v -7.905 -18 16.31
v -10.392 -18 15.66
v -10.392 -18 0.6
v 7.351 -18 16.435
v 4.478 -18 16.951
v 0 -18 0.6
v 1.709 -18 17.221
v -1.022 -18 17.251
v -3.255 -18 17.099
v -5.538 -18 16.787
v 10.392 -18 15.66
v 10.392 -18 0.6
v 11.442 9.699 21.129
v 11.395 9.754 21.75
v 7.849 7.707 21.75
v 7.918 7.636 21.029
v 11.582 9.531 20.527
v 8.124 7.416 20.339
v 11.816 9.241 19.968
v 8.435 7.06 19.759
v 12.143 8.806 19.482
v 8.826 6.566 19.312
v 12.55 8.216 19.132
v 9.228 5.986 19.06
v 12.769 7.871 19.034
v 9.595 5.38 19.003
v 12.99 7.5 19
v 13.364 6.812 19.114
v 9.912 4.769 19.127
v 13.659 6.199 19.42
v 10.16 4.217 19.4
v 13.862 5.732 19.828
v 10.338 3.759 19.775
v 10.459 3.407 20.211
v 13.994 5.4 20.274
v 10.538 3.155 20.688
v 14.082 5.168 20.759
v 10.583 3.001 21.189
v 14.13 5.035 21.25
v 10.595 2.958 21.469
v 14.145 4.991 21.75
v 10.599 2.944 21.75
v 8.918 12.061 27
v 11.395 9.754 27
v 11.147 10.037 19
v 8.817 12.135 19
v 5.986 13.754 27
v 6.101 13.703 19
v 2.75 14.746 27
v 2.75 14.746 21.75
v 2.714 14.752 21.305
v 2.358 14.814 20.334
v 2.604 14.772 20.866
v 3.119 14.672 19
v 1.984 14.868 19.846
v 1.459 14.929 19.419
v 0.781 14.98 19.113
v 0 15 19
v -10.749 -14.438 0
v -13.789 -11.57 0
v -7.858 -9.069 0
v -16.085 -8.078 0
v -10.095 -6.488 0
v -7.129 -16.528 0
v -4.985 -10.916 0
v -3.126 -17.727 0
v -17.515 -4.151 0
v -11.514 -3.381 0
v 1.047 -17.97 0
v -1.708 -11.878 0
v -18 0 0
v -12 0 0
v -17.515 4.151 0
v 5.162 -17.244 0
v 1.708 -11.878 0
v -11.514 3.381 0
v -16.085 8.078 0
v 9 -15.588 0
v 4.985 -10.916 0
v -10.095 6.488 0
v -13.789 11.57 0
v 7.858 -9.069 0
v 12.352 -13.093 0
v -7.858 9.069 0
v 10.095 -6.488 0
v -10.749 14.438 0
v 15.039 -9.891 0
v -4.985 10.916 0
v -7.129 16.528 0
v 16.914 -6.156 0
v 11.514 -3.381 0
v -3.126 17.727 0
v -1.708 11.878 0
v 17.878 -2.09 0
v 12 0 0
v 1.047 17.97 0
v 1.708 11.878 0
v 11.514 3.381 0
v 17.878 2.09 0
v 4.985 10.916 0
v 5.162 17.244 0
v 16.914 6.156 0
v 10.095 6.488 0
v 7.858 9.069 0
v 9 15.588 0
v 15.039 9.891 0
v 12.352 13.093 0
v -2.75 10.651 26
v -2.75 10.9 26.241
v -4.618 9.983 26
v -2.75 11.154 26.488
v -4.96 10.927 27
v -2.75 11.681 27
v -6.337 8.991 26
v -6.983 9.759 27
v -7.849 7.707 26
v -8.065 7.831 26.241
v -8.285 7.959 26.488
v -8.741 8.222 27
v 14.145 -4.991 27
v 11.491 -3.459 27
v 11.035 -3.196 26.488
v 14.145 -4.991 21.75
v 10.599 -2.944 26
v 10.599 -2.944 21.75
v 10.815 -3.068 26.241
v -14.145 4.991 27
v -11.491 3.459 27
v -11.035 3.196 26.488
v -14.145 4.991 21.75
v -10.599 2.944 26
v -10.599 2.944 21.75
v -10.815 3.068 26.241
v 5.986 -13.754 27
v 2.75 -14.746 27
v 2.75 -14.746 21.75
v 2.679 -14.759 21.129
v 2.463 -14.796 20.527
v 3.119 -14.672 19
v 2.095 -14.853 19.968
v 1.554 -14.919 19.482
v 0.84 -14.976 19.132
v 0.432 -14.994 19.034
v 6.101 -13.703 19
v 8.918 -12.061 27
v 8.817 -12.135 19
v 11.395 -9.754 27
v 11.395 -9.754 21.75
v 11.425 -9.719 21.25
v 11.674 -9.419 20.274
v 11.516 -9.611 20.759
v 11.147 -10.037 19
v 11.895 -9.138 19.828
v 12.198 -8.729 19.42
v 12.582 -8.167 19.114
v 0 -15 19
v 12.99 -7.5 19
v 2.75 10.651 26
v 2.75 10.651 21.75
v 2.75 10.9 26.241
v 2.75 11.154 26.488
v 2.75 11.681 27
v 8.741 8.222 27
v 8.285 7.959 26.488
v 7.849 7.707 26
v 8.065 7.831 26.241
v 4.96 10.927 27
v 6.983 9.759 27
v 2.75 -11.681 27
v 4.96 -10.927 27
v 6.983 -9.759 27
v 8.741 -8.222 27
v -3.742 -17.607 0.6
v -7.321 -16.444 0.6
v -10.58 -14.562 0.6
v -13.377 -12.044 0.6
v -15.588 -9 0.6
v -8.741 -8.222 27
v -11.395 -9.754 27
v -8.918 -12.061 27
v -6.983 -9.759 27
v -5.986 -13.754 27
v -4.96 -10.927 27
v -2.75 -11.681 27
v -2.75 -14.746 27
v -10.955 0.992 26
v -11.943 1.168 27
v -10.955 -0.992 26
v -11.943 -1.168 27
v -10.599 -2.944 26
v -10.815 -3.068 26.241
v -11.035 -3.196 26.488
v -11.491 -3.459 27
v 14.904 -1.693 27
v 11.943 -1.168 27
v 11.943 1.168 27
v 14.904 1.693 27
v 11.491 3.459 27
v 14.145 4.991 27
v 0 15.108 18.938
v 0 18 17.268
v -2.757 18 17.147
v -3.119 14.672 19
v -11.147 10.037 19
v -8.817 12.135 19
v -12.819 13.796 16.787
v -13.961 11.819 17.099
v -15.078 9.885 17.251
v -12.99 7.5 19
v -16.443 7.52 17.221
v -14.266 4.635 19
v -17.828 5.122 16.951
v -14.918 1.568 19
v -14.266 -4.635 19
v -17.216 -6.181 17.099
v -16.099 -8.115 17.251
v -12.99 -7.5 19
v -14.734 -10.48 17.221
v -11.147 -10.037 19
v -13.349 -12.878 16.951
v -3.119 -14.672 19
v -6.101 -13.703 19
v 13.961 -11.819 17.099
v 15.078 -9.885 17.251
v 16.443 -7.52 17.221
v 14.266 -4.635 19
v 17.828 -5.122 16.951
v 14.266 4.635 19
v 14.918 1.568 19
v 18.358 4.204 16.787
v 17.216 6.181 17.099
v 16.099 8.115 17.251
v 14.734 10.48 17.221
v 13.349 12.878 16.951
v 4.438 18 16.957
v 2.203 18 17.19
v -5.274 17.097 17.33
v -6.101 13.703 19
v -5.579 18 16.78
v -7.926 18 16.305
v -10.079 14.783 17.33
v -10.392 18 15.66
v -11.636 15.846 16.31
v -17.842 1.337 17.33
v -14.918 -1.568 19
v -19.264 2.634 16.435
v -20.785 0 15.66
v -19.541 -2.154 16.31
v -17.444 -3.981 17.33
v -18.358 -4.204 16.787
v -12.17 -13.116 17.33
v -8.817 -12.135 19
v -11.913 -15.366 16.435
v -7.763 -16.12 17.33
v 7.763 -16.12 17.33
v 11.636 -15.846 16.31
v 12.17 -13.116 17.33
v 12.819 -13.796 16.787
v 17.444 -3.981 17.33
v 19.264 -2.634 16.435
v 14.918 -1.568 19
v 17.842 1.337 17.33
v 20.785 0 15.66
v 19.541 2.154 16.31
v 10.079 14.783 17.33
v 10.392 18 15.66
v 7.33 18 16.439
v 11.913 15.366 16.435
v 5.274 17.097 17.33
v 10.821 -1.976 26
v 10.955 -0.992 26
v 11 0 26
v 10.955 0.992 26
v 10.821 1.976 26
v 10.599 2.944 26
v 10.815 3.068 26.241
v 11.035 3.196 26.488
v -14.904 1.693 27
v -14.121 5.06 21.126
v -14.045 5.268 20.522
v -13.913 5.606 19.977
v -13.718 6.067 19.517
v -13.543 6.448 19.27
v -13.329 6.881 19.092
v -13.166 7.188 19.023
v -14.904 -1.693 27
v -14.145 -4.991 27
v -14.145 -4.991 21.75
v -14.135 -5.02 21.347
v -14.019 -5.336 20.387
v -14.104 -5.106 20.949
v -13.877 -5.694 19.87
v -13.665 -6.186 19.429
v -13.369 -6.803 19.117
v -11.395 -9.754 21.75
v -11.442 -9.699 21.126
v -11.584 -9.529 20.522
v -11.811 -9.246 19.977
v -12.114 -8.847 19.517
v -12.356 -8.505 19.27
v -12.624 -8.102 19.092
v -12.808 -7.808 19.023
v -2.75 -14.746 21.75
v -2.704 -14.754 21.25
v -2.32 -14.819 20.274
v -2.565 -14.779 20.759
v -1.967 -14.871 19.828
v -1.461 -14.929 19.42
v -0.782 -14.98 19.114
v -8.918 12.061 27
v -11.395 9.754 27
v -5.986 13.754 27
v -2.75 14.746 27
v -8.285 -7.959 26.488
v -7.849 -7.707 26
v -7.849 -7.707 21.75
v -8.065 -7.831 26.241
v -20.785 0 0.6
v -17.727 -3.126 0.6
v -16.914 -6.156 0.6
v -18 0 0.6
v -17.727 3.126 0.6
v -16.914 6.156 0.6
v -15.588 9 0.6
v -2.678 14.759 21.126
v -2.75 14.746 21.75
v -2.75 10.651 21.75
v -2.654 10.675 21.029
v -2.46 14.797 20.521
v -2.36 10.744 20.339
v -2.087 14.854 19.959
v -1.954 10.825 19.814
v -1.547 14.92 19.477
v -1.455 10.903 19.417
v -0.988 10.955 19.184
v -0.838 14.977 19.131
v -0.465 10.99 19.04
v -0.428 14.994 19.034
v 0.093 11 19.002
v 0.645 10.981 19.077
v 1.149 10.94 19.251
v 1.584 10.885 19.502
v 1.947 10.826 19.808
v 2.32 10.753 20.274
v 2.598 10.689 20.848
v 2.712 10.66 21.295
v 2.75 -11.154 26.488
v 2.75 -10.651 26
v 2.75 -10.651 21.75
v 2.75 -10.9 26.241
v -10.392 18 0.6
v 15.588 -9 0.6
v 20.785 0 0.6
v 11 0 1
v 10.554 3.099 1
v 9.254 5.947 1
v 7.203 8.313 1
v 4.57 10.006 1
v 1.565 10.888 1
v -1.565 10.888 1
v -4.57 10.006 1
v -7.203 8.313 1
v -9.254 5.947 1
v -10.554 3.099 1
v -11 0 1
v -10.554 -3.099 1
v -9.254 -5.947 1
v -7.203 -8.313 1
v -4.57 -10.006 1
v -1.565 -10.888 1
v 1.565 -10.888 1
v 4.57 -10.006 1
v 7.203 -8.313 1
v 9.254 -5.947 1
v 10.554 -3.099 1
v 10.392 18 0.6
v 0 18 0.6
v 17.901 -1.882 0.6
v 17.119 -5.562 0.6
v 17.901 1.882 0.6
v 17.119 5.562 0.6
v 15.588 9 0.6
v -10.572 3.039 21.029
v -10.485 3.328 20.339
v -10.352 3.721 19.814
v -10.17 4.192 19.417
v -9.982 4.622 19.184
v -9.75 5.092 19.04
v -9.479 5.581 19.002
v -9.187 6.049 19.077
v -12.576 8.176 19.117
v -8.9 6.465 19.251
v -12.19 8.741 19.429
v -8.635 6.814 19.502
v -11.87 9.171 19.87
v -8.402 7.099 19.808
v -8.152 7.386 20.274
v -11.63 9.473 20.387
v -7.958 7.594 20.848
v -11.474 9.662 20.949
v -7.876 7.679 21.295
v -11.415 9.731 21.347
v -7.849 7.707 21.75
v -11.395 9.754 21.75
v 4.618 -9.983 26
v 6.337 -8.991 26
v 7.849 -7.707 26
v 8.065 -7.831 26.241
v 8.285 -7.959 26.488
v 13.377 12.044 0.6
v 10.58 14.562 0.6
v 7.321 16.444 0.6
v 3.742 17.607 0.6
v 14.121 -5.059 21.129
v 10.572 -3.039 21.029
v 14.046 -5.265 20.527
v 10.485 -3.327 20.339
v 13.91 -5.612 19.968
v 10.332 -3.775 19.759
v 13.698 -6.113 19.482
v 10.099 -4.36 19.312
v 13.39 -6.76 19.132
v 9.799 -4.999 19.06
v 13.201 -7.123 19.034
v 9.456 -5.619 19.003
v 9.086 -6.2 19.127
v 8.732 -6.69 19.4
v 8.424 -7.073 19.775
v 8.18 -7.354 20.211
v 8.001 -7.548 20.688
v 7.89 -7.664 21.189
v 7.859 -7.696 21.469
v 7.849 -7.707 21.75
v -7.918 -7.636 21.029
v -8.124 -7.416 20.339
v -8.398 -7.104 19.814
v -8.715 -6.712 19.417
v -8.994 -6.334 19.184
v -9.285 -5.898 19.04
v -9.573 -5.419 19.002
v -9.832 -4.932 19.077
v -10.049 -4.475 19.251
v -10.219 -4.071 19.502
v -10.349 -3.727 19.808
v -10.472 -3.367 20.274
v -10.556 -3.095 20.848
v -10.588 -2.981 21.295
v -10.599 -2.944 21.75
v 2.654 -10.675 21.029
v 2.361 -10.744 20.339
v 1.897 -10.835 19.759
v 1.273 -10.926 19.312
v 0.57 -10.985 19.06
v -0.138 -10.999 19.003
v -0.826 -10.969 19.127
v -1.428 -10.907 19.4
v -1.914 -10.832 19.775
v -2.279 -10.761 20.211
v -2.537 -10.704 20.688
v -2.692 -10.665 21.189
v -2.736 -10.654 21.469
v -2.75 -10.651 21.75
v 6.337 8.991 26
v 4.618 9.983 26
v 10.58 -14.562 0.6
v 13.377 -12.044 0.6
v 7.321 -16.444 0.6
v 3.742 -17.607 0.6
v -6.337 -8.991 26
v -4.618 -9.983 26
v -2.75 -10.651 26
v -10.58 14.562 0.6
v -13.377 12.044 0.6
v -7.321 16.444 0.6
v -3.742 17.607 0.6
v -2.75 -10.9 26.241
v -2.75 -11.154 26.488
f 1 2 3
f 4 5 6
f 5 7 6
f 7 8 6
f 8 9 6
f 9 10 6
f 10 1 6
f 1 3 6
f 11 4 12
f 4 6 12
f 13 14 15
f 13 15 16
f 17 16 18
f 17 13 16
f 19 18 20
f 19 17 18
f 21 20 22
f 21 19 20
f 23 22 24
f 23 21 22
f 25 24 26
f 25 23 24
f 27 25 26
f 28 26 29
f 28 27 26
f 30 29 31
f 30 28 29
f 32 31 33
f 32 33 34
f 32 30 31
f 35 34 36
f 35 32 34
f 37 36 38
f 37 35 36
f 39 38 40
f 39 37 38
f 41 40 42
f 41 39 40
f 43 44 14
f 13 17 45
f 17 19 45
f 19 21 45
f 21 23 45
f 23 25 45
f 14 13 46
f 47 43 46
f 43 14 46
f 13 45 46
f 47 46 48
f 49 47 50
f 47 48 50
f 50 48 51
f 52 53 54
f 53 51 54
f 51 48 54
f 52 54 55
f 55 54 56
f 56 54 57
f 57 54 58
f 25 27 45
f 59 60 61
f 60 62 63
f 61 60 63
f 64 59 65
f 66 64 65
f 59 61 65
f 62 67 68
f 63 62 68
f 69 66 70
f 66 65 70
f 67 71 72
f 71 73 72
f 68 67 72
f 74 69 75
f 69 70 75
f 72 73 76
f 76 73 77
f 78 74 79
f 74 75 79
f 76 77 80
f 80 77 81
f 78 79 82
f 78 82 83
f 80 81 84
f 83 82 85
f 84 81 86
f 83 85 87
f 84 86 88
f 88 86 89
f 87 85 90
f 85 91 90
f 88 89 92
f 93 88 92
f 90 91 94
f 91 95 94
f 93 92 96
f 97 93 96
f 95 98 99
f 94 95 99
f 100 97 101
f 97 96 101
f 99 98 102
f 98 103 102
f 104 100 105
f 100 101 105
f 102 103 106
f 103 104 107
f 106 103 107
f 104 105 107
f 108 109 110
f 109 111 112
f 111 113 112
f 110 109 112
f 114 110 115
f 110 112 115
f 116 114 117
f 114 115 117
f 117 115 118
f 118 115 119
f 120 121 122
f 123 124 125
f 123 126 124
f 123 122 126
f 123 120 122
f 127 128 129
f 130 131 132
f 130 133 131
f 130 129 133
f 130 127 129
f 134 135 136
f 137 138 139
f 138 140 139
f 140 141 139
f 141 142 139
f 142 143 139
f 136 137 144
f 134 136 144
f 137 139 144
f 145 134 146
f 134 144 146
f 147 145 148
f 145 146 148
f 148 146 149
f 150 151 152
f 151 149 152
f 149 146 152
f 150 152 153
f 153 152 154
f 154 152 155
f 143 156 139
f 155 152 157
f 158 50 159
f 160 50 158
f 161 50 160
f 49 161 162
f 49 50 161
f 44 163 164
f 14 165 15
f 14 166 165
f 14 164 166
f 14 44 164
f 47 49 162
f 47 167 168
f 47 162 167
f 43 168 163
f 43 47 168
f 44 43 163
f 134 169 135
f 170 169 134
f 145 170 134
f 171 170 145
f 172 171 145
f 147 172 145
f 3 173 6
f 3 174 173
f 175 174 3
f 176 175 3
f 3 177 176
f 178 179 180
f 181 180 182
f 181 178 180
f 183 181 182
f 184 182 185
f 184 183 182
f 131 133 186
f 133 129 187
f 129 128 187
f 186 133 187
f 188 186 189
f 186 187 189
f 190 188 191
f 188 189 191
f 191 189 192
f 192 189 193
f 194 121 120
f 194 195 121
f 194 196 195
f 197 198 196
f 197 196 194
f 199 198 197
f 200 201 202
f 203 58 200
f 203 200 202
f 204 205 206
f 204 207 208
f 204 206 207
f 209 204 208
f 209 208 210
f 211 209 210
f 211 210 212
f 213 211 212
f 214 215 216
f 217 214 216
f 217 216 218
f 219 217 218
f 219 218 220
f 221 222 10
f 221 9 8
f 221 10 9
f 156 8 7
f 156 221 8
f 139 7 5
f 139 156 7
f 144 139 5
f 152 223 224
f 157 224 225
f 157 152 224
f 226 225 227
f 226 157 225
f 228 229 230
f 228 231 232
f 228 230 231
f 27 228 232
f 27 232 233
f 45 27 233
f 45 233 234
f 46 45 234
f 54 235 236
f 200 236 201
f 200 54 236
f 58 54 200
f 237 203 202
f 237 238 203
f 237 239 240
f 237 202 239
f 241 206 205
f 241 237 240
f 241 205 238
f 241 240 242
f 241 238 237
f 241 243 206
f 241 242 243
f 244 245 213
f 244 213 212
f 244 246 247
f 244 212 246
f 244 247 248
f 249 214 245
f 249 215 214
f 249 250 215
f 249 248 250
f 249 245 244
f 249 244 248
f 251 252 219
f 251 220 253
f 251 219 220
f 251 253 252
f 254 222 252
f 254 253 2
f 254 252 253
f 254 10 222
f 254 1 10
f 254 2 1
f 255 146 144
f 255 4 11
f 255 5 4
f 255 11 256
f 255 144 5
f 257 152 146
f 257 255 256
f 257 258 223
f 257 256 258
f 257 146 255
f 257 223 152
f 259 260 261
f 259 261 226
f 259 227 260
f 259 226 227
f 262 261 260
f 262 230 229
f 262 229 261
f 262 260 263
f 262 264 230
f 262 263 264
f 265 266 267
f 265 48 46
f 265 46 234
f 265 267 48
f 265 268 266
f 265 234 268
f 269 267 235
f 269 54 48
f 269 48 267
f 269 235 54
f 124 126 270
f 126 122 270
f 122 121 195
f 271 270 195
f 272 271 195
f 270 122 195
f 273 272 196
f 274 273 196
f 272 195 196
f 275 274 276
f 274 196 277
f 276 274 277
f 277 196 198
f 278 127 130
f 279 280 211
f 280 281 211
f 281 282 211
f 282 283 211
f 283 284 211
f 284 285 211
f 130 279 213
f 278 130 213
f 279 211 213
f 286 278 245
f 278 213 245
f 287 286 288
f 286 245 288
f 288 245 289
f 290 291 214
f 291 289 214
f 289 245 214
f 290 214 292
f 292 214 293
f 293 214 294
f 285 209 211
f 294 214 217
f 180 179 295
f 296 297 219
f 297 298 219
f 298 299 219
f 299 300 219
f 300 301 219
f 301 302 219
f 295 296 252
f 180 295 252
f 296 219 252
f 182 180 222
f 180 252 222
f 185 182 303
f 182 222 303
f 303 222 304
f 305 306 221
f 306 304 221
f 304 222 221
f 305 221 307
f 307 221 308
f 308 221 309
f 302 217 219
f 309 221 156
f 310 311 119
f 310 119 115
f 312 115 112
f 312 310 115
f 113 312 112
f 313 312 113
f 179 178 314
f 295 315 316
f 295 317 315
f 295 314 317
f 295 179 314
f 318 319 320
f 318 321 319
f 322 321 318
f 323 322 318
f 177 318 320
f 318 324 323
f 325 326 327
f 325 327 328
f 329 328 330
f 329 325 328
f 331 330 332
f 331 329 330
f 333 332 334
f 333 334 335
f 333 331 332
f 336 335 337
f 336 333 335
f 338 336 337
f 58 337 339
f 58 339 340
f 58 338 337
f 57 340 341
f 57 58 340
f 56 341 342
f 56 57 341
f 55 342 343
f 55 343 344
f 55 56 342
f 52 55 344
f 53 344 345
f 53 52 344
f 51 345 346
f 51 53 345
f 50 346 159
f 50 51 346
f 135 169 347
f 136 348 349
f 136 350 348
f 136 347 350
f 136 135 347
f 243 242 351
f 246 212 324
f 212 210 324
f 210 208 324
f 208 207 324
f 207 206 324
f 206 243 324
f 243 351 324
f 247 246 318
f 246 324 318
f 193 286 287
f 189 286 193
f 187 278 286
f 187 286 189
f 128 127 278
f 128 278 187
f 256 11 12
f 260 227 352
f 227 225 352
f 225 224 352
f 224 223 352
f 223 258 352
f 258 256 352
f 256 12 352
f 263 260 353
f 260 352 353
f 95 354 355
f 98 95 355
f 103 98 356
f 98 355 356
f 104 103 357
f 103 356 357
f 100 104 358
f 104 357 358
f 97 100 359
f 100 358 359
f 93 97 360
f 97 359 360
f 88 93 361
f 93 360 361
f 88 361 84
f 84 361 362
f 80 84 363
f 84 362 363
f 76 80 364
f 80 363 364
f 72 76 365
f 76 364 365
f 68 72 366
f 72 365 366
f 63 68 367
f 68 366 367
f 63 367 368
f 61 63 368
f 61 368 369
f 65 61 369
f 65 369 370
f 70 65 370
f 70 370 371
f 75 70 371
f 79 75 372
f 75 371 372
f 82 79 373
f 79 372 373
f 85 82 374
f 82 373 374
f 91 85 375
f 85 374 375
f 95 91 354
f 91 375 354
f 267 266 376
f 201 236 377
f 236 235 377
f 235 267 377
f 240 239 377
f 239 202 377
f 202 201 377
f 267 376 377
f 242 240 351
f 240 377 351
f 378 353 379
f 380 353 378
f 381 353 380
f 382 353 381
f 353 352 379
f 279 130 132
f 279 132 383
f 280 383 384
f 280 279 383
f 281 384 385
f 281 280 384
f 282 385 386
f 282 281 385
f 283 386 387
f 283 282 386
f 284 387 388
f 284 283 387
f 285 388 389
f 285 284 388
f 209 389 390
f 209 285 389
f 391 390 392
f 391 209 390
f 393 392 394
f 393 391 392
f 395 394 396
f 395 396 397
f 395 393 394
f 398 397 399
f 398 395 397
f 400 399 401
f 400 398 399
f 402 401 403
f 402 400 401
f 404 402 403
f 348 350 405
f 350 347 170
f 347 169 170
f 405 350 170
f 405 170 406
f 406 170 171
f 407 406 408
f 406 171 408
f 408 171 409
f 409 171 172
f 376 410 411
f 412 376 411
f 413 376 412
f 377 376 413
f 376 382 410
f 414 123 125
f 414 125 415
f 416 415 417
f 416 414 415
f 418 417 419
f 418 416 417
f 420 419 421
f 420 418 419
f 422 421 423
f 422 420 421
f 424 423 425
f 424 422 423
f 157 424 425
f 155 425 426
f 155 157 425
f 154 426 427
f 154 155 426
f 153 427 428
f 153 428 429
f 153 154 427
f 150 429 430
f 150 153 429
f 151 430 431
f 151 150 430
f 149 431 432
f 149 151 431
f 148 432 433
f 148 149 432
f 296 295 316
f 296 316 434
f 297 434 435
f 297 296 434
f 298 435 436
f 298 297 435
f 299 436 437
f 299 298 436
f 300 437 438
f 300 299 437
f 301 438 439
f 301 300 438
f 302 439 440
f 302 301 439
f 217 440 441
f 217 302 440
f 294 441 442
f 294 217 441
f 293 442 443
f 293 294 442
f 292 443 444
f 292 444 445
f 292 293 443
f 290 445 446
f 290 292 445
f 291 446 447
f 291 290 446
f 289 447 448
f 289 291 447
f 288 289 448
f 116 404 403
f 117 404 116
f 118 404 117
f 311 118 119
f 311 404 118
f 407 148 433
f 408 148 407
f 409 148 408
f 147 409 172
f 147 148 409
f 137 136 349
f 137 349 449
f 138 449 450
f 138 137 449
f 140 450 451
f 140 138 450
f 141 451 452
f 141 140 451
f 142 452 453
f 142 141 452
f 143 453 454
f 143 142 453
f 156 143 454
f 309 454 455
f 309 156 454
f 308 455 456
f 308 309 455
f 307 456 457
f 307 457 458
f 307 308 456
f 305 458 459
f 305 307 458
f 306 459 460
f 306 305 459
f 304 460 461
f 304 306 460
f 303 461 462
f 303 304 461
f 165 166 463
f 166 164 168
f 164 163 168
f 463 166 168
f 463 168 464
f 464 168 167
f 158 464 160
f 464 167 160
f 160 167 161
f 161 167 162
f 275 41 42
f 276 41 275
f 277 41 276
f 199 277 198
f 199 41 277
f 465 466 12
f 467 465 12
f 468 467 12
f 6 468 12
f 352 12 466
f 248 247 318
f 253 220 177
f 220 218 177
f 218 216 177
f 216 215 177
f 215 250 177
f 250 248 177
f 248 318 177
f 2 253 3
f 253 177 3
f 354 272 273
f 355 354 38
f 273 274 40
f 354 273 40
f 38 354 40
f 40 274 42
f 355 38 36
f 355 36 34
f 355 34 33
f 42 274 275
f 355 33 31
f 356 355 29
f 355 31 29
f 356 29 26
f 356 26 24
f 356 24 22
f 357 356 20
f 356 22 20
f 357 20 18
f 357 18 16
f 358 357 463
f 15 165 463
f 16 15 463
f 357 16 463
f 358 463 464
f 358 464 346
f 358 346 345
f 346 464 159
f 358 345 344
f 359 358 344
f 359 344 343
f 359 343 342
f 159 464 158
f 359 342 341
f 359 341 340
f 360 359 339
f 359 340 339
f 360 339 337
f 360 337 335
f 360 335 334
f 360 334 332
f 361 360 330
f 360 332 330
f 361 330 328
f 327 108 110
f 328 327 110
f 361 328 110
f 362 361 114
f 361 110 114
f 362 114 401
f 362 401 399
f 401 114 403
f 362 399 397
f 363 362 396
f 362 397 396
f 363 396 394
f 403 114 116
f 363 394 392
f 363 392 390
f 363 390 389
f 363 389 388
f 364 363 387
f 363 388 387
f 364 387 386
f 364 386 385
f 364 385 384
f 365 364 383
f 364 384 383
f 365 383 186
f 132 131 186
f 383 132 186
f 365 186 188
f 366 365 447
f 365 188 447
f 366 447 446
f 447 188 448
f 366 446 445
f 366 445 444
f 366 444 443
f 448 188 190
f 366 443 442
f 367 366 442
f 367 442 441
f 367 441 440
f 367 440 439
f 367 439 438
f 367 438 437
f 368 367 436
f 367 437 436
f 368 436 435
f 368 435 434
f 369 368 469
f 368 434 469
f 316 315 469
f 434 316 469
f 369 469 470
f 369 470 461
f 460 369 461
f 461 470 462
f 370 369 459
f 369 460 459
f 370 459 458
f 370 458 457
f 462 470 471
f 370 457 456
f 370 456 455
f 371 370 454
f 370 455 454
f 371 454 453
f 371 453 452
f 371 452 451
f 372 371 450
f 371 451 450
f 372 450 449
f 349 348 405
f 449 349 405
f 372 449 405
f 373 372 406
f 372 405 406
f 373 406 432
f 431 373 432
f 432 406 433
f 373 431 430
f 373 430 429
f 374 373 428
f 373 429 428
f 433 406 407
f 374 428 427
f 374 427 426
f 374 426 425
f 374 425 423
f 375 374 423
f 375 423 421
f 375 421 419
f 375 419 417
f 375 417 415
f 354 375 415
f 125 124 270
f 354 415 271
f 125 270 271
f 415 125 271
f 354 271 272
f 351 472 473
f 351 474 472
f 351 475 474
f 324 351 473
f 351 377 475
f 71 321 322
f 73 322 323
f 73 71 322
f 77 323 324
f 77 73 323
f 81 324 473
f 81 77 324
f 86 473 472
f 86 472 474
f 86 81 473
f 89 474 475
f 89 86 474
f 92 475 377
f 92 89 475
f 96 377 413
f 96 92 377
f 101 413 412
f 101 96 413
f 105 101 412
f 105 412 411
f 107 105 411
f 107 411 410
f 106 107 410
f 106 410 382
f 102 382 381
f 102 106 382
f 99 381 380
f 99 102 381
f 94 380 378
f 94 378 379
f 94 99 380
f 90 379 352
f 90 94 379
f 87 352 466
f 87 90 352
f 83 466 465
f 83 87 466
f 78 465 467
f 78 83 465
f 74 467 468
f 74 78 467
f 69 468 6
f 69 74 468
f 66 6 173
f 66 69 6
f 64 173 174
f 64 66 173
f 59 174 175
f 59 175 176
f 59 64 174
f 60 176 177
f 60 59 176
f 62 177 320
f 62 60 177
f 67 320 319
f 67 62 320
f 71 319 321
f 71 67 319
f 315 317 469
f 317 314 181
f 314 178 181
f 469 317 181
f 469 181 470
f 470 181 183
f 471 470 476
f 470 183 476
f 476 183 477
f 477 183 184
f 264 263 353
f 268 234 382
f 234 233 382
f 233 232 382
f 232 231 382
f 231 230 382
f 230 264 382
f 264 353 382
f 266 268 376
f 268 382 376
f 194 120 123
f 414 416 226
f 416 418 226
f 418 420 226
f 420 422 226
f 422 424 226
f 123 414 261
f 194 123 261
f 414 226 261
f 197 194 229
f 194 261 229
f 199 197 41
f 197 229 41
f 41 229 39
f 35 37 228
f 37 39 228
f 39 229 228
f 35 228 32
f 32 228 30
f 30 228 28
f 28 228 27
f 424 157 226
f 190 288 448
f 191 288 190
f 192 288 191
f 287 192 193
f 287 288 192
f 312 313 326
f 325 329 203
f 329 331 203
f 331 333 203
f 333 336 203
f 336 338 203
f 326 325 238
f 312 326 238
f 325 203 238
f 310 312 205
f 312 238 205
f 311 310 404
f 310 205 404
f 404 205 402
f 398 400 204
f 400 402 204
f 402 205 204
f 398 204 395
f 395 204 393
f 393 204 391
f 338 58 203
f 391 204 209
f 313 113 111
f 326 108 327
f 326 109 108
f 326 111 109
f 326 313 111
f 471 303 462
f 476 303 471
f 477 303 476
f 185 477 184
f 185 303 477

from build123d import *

# Parameters (mm, degrees)
BOSS_EXTRUDE1_DEPTH     = 19
SKETCH2_R               = 15
BOSS_EXTRUDE2_DEPTH     = 8
SKETCH4_R               = 28
SKETCH4_R_2             = 18
CUT_EXTRUDE_THIN1_DEPTH = 0.6
CUT_EXTRUDE1_REACH      = 40.536
SKETCH5_R               = 11
CUT_EXTRUDE2_REACH      = 40.536
CIRPATTERN1_COUNT       = 6
CHAMFER1_SIZE           = 1


with BuildPart() as part:
    # Sketch1 → Boss-Extrude1 (new body)
    with BuildSketch(Plane.XY):
        Polygon((20.784609691, 0), (10.392304845, 18), (-10.392304845, 18), (-20.784609691, 0), (-10.392304845, -18), (10.392304845, -18), align=None)
    extrude(amount=BOSS_EXTRUDE1_DEPTH)

    # Sketch2 → Boss-Extrude2 (add)
    with BuildSketch(Plane.XY.offset(19)):
        Circle(SKETCH2_R)
    extrude(amount=BOSS_EXTRUDE2_DEPTH)

    # Sketch3 → Cut-Revolve1 (revolve, cut)
    with BuildSketch(Plane(origin=(0, 0, 0), x_dir=(0, 0, -1), z_dir=(1, 0, 0))):
        Polygon((-19, 15), (-19, 25.977792564), (-12.661968508, 25.977792564), align=None)
    revolve(axis=Axis((0, 0, -102.328960849), (0, 0, 1)), mode=Mode.SUBTRACT)

    # Sketch4 → Cut-Extrude-Thin1 (cut)
    with BuildSketch(Plane(origin=(0, 0, 0), x_dir=(-1, 0, 0), z_dir=(0, 0, -1))):
        Circle(SKETCH4_R)
        Circle(SKETCH4_R_2, mode=Mode.SUBTRACT)
    extrude(amount=-CUT_EXTRUDE_THIN1_DEPTH, mode=Mode.SUBTRACT)

    # Sketch5 → Cut-Extrude1 (cut, up to next)
    with BuildSketch(Plane.XY.offset(27), mode=Mode.PRIVATE) as cut_extrude1_sk1:
        Circle(SKETCH5_R)
    cut_extrude1_tool1 = extrude(cut_extrude1_sk1.sketch, amount=-CUT_EXTRUDE1_REACH, mode=Mode.PRIVATE) & part.part
    add(cut_extrude1_tool1.solids().sort_by_distance((0, 0, 27))[0], mode=Mode.SUBTRACT)

    # Sketch6 → Cut-Extrude2 (cut, up to next)
    with BuildSketch(Plane(origin=(0, 0, 0), x_dir=(1, 0, 0), z_dir=(0, 1, 0)), mode=Mode.PRIVATE) as cut_extrude2_sk1:
        with BuildLine():
            Line((-2.75, -21.75), (-2.75, -27))
            Line((-2.75, -27), (2.75, -27))
            Line((2.75, -27), (2.75, -21.75))
            ThreePointArc((2.75, -21.75), (0, -19), (-2.75, -21.75))
        make_face()
    cut_extrude2_tool1 = extrude(cut_extrude2_sk1.sketch, amount=-CUT_EXTRUDE2_REACH, mode=Mode.PRIVATE) & part.part
    cut_extrude2 = cut_extrude2_tool1.solids().sort_by_distance((0, 0, 23.269656))[0]
    add(cut_extrude2, mode=Mode.SUBTRACT)

    # CirPattern1: Cut-Extrude2 ×6 about axis
    cirpattern1_axis = Axis((0, 0, -0.001), (0, 0, 1))
    for i in range(1, CIRPATTERN1_COUNT):
        add(cut_extrude2.rotate(cirpattern1_axis, i * 360 / CIRPATTERN1_COUNT), mode=Mode.SUBTRACT)

    # Chamfer1
    chamfer1_edges = [part.edges().sort_by_distance(p)[0] for p in [
        (-5.5, -9.526279442, 27),
        (-11, 0, 27),
        (-5.5, 9.526279442, 27),
        (5.5, 9.526279442, 27),
        (10.899233562, -1.485499162, 27),
        (5.5, -9.526279442, 27),
        (-11, 0, 0),
    ]]
    chamfer(chamfer1_edges, length=CHAMFER1_SIZE)


solid = part.part
